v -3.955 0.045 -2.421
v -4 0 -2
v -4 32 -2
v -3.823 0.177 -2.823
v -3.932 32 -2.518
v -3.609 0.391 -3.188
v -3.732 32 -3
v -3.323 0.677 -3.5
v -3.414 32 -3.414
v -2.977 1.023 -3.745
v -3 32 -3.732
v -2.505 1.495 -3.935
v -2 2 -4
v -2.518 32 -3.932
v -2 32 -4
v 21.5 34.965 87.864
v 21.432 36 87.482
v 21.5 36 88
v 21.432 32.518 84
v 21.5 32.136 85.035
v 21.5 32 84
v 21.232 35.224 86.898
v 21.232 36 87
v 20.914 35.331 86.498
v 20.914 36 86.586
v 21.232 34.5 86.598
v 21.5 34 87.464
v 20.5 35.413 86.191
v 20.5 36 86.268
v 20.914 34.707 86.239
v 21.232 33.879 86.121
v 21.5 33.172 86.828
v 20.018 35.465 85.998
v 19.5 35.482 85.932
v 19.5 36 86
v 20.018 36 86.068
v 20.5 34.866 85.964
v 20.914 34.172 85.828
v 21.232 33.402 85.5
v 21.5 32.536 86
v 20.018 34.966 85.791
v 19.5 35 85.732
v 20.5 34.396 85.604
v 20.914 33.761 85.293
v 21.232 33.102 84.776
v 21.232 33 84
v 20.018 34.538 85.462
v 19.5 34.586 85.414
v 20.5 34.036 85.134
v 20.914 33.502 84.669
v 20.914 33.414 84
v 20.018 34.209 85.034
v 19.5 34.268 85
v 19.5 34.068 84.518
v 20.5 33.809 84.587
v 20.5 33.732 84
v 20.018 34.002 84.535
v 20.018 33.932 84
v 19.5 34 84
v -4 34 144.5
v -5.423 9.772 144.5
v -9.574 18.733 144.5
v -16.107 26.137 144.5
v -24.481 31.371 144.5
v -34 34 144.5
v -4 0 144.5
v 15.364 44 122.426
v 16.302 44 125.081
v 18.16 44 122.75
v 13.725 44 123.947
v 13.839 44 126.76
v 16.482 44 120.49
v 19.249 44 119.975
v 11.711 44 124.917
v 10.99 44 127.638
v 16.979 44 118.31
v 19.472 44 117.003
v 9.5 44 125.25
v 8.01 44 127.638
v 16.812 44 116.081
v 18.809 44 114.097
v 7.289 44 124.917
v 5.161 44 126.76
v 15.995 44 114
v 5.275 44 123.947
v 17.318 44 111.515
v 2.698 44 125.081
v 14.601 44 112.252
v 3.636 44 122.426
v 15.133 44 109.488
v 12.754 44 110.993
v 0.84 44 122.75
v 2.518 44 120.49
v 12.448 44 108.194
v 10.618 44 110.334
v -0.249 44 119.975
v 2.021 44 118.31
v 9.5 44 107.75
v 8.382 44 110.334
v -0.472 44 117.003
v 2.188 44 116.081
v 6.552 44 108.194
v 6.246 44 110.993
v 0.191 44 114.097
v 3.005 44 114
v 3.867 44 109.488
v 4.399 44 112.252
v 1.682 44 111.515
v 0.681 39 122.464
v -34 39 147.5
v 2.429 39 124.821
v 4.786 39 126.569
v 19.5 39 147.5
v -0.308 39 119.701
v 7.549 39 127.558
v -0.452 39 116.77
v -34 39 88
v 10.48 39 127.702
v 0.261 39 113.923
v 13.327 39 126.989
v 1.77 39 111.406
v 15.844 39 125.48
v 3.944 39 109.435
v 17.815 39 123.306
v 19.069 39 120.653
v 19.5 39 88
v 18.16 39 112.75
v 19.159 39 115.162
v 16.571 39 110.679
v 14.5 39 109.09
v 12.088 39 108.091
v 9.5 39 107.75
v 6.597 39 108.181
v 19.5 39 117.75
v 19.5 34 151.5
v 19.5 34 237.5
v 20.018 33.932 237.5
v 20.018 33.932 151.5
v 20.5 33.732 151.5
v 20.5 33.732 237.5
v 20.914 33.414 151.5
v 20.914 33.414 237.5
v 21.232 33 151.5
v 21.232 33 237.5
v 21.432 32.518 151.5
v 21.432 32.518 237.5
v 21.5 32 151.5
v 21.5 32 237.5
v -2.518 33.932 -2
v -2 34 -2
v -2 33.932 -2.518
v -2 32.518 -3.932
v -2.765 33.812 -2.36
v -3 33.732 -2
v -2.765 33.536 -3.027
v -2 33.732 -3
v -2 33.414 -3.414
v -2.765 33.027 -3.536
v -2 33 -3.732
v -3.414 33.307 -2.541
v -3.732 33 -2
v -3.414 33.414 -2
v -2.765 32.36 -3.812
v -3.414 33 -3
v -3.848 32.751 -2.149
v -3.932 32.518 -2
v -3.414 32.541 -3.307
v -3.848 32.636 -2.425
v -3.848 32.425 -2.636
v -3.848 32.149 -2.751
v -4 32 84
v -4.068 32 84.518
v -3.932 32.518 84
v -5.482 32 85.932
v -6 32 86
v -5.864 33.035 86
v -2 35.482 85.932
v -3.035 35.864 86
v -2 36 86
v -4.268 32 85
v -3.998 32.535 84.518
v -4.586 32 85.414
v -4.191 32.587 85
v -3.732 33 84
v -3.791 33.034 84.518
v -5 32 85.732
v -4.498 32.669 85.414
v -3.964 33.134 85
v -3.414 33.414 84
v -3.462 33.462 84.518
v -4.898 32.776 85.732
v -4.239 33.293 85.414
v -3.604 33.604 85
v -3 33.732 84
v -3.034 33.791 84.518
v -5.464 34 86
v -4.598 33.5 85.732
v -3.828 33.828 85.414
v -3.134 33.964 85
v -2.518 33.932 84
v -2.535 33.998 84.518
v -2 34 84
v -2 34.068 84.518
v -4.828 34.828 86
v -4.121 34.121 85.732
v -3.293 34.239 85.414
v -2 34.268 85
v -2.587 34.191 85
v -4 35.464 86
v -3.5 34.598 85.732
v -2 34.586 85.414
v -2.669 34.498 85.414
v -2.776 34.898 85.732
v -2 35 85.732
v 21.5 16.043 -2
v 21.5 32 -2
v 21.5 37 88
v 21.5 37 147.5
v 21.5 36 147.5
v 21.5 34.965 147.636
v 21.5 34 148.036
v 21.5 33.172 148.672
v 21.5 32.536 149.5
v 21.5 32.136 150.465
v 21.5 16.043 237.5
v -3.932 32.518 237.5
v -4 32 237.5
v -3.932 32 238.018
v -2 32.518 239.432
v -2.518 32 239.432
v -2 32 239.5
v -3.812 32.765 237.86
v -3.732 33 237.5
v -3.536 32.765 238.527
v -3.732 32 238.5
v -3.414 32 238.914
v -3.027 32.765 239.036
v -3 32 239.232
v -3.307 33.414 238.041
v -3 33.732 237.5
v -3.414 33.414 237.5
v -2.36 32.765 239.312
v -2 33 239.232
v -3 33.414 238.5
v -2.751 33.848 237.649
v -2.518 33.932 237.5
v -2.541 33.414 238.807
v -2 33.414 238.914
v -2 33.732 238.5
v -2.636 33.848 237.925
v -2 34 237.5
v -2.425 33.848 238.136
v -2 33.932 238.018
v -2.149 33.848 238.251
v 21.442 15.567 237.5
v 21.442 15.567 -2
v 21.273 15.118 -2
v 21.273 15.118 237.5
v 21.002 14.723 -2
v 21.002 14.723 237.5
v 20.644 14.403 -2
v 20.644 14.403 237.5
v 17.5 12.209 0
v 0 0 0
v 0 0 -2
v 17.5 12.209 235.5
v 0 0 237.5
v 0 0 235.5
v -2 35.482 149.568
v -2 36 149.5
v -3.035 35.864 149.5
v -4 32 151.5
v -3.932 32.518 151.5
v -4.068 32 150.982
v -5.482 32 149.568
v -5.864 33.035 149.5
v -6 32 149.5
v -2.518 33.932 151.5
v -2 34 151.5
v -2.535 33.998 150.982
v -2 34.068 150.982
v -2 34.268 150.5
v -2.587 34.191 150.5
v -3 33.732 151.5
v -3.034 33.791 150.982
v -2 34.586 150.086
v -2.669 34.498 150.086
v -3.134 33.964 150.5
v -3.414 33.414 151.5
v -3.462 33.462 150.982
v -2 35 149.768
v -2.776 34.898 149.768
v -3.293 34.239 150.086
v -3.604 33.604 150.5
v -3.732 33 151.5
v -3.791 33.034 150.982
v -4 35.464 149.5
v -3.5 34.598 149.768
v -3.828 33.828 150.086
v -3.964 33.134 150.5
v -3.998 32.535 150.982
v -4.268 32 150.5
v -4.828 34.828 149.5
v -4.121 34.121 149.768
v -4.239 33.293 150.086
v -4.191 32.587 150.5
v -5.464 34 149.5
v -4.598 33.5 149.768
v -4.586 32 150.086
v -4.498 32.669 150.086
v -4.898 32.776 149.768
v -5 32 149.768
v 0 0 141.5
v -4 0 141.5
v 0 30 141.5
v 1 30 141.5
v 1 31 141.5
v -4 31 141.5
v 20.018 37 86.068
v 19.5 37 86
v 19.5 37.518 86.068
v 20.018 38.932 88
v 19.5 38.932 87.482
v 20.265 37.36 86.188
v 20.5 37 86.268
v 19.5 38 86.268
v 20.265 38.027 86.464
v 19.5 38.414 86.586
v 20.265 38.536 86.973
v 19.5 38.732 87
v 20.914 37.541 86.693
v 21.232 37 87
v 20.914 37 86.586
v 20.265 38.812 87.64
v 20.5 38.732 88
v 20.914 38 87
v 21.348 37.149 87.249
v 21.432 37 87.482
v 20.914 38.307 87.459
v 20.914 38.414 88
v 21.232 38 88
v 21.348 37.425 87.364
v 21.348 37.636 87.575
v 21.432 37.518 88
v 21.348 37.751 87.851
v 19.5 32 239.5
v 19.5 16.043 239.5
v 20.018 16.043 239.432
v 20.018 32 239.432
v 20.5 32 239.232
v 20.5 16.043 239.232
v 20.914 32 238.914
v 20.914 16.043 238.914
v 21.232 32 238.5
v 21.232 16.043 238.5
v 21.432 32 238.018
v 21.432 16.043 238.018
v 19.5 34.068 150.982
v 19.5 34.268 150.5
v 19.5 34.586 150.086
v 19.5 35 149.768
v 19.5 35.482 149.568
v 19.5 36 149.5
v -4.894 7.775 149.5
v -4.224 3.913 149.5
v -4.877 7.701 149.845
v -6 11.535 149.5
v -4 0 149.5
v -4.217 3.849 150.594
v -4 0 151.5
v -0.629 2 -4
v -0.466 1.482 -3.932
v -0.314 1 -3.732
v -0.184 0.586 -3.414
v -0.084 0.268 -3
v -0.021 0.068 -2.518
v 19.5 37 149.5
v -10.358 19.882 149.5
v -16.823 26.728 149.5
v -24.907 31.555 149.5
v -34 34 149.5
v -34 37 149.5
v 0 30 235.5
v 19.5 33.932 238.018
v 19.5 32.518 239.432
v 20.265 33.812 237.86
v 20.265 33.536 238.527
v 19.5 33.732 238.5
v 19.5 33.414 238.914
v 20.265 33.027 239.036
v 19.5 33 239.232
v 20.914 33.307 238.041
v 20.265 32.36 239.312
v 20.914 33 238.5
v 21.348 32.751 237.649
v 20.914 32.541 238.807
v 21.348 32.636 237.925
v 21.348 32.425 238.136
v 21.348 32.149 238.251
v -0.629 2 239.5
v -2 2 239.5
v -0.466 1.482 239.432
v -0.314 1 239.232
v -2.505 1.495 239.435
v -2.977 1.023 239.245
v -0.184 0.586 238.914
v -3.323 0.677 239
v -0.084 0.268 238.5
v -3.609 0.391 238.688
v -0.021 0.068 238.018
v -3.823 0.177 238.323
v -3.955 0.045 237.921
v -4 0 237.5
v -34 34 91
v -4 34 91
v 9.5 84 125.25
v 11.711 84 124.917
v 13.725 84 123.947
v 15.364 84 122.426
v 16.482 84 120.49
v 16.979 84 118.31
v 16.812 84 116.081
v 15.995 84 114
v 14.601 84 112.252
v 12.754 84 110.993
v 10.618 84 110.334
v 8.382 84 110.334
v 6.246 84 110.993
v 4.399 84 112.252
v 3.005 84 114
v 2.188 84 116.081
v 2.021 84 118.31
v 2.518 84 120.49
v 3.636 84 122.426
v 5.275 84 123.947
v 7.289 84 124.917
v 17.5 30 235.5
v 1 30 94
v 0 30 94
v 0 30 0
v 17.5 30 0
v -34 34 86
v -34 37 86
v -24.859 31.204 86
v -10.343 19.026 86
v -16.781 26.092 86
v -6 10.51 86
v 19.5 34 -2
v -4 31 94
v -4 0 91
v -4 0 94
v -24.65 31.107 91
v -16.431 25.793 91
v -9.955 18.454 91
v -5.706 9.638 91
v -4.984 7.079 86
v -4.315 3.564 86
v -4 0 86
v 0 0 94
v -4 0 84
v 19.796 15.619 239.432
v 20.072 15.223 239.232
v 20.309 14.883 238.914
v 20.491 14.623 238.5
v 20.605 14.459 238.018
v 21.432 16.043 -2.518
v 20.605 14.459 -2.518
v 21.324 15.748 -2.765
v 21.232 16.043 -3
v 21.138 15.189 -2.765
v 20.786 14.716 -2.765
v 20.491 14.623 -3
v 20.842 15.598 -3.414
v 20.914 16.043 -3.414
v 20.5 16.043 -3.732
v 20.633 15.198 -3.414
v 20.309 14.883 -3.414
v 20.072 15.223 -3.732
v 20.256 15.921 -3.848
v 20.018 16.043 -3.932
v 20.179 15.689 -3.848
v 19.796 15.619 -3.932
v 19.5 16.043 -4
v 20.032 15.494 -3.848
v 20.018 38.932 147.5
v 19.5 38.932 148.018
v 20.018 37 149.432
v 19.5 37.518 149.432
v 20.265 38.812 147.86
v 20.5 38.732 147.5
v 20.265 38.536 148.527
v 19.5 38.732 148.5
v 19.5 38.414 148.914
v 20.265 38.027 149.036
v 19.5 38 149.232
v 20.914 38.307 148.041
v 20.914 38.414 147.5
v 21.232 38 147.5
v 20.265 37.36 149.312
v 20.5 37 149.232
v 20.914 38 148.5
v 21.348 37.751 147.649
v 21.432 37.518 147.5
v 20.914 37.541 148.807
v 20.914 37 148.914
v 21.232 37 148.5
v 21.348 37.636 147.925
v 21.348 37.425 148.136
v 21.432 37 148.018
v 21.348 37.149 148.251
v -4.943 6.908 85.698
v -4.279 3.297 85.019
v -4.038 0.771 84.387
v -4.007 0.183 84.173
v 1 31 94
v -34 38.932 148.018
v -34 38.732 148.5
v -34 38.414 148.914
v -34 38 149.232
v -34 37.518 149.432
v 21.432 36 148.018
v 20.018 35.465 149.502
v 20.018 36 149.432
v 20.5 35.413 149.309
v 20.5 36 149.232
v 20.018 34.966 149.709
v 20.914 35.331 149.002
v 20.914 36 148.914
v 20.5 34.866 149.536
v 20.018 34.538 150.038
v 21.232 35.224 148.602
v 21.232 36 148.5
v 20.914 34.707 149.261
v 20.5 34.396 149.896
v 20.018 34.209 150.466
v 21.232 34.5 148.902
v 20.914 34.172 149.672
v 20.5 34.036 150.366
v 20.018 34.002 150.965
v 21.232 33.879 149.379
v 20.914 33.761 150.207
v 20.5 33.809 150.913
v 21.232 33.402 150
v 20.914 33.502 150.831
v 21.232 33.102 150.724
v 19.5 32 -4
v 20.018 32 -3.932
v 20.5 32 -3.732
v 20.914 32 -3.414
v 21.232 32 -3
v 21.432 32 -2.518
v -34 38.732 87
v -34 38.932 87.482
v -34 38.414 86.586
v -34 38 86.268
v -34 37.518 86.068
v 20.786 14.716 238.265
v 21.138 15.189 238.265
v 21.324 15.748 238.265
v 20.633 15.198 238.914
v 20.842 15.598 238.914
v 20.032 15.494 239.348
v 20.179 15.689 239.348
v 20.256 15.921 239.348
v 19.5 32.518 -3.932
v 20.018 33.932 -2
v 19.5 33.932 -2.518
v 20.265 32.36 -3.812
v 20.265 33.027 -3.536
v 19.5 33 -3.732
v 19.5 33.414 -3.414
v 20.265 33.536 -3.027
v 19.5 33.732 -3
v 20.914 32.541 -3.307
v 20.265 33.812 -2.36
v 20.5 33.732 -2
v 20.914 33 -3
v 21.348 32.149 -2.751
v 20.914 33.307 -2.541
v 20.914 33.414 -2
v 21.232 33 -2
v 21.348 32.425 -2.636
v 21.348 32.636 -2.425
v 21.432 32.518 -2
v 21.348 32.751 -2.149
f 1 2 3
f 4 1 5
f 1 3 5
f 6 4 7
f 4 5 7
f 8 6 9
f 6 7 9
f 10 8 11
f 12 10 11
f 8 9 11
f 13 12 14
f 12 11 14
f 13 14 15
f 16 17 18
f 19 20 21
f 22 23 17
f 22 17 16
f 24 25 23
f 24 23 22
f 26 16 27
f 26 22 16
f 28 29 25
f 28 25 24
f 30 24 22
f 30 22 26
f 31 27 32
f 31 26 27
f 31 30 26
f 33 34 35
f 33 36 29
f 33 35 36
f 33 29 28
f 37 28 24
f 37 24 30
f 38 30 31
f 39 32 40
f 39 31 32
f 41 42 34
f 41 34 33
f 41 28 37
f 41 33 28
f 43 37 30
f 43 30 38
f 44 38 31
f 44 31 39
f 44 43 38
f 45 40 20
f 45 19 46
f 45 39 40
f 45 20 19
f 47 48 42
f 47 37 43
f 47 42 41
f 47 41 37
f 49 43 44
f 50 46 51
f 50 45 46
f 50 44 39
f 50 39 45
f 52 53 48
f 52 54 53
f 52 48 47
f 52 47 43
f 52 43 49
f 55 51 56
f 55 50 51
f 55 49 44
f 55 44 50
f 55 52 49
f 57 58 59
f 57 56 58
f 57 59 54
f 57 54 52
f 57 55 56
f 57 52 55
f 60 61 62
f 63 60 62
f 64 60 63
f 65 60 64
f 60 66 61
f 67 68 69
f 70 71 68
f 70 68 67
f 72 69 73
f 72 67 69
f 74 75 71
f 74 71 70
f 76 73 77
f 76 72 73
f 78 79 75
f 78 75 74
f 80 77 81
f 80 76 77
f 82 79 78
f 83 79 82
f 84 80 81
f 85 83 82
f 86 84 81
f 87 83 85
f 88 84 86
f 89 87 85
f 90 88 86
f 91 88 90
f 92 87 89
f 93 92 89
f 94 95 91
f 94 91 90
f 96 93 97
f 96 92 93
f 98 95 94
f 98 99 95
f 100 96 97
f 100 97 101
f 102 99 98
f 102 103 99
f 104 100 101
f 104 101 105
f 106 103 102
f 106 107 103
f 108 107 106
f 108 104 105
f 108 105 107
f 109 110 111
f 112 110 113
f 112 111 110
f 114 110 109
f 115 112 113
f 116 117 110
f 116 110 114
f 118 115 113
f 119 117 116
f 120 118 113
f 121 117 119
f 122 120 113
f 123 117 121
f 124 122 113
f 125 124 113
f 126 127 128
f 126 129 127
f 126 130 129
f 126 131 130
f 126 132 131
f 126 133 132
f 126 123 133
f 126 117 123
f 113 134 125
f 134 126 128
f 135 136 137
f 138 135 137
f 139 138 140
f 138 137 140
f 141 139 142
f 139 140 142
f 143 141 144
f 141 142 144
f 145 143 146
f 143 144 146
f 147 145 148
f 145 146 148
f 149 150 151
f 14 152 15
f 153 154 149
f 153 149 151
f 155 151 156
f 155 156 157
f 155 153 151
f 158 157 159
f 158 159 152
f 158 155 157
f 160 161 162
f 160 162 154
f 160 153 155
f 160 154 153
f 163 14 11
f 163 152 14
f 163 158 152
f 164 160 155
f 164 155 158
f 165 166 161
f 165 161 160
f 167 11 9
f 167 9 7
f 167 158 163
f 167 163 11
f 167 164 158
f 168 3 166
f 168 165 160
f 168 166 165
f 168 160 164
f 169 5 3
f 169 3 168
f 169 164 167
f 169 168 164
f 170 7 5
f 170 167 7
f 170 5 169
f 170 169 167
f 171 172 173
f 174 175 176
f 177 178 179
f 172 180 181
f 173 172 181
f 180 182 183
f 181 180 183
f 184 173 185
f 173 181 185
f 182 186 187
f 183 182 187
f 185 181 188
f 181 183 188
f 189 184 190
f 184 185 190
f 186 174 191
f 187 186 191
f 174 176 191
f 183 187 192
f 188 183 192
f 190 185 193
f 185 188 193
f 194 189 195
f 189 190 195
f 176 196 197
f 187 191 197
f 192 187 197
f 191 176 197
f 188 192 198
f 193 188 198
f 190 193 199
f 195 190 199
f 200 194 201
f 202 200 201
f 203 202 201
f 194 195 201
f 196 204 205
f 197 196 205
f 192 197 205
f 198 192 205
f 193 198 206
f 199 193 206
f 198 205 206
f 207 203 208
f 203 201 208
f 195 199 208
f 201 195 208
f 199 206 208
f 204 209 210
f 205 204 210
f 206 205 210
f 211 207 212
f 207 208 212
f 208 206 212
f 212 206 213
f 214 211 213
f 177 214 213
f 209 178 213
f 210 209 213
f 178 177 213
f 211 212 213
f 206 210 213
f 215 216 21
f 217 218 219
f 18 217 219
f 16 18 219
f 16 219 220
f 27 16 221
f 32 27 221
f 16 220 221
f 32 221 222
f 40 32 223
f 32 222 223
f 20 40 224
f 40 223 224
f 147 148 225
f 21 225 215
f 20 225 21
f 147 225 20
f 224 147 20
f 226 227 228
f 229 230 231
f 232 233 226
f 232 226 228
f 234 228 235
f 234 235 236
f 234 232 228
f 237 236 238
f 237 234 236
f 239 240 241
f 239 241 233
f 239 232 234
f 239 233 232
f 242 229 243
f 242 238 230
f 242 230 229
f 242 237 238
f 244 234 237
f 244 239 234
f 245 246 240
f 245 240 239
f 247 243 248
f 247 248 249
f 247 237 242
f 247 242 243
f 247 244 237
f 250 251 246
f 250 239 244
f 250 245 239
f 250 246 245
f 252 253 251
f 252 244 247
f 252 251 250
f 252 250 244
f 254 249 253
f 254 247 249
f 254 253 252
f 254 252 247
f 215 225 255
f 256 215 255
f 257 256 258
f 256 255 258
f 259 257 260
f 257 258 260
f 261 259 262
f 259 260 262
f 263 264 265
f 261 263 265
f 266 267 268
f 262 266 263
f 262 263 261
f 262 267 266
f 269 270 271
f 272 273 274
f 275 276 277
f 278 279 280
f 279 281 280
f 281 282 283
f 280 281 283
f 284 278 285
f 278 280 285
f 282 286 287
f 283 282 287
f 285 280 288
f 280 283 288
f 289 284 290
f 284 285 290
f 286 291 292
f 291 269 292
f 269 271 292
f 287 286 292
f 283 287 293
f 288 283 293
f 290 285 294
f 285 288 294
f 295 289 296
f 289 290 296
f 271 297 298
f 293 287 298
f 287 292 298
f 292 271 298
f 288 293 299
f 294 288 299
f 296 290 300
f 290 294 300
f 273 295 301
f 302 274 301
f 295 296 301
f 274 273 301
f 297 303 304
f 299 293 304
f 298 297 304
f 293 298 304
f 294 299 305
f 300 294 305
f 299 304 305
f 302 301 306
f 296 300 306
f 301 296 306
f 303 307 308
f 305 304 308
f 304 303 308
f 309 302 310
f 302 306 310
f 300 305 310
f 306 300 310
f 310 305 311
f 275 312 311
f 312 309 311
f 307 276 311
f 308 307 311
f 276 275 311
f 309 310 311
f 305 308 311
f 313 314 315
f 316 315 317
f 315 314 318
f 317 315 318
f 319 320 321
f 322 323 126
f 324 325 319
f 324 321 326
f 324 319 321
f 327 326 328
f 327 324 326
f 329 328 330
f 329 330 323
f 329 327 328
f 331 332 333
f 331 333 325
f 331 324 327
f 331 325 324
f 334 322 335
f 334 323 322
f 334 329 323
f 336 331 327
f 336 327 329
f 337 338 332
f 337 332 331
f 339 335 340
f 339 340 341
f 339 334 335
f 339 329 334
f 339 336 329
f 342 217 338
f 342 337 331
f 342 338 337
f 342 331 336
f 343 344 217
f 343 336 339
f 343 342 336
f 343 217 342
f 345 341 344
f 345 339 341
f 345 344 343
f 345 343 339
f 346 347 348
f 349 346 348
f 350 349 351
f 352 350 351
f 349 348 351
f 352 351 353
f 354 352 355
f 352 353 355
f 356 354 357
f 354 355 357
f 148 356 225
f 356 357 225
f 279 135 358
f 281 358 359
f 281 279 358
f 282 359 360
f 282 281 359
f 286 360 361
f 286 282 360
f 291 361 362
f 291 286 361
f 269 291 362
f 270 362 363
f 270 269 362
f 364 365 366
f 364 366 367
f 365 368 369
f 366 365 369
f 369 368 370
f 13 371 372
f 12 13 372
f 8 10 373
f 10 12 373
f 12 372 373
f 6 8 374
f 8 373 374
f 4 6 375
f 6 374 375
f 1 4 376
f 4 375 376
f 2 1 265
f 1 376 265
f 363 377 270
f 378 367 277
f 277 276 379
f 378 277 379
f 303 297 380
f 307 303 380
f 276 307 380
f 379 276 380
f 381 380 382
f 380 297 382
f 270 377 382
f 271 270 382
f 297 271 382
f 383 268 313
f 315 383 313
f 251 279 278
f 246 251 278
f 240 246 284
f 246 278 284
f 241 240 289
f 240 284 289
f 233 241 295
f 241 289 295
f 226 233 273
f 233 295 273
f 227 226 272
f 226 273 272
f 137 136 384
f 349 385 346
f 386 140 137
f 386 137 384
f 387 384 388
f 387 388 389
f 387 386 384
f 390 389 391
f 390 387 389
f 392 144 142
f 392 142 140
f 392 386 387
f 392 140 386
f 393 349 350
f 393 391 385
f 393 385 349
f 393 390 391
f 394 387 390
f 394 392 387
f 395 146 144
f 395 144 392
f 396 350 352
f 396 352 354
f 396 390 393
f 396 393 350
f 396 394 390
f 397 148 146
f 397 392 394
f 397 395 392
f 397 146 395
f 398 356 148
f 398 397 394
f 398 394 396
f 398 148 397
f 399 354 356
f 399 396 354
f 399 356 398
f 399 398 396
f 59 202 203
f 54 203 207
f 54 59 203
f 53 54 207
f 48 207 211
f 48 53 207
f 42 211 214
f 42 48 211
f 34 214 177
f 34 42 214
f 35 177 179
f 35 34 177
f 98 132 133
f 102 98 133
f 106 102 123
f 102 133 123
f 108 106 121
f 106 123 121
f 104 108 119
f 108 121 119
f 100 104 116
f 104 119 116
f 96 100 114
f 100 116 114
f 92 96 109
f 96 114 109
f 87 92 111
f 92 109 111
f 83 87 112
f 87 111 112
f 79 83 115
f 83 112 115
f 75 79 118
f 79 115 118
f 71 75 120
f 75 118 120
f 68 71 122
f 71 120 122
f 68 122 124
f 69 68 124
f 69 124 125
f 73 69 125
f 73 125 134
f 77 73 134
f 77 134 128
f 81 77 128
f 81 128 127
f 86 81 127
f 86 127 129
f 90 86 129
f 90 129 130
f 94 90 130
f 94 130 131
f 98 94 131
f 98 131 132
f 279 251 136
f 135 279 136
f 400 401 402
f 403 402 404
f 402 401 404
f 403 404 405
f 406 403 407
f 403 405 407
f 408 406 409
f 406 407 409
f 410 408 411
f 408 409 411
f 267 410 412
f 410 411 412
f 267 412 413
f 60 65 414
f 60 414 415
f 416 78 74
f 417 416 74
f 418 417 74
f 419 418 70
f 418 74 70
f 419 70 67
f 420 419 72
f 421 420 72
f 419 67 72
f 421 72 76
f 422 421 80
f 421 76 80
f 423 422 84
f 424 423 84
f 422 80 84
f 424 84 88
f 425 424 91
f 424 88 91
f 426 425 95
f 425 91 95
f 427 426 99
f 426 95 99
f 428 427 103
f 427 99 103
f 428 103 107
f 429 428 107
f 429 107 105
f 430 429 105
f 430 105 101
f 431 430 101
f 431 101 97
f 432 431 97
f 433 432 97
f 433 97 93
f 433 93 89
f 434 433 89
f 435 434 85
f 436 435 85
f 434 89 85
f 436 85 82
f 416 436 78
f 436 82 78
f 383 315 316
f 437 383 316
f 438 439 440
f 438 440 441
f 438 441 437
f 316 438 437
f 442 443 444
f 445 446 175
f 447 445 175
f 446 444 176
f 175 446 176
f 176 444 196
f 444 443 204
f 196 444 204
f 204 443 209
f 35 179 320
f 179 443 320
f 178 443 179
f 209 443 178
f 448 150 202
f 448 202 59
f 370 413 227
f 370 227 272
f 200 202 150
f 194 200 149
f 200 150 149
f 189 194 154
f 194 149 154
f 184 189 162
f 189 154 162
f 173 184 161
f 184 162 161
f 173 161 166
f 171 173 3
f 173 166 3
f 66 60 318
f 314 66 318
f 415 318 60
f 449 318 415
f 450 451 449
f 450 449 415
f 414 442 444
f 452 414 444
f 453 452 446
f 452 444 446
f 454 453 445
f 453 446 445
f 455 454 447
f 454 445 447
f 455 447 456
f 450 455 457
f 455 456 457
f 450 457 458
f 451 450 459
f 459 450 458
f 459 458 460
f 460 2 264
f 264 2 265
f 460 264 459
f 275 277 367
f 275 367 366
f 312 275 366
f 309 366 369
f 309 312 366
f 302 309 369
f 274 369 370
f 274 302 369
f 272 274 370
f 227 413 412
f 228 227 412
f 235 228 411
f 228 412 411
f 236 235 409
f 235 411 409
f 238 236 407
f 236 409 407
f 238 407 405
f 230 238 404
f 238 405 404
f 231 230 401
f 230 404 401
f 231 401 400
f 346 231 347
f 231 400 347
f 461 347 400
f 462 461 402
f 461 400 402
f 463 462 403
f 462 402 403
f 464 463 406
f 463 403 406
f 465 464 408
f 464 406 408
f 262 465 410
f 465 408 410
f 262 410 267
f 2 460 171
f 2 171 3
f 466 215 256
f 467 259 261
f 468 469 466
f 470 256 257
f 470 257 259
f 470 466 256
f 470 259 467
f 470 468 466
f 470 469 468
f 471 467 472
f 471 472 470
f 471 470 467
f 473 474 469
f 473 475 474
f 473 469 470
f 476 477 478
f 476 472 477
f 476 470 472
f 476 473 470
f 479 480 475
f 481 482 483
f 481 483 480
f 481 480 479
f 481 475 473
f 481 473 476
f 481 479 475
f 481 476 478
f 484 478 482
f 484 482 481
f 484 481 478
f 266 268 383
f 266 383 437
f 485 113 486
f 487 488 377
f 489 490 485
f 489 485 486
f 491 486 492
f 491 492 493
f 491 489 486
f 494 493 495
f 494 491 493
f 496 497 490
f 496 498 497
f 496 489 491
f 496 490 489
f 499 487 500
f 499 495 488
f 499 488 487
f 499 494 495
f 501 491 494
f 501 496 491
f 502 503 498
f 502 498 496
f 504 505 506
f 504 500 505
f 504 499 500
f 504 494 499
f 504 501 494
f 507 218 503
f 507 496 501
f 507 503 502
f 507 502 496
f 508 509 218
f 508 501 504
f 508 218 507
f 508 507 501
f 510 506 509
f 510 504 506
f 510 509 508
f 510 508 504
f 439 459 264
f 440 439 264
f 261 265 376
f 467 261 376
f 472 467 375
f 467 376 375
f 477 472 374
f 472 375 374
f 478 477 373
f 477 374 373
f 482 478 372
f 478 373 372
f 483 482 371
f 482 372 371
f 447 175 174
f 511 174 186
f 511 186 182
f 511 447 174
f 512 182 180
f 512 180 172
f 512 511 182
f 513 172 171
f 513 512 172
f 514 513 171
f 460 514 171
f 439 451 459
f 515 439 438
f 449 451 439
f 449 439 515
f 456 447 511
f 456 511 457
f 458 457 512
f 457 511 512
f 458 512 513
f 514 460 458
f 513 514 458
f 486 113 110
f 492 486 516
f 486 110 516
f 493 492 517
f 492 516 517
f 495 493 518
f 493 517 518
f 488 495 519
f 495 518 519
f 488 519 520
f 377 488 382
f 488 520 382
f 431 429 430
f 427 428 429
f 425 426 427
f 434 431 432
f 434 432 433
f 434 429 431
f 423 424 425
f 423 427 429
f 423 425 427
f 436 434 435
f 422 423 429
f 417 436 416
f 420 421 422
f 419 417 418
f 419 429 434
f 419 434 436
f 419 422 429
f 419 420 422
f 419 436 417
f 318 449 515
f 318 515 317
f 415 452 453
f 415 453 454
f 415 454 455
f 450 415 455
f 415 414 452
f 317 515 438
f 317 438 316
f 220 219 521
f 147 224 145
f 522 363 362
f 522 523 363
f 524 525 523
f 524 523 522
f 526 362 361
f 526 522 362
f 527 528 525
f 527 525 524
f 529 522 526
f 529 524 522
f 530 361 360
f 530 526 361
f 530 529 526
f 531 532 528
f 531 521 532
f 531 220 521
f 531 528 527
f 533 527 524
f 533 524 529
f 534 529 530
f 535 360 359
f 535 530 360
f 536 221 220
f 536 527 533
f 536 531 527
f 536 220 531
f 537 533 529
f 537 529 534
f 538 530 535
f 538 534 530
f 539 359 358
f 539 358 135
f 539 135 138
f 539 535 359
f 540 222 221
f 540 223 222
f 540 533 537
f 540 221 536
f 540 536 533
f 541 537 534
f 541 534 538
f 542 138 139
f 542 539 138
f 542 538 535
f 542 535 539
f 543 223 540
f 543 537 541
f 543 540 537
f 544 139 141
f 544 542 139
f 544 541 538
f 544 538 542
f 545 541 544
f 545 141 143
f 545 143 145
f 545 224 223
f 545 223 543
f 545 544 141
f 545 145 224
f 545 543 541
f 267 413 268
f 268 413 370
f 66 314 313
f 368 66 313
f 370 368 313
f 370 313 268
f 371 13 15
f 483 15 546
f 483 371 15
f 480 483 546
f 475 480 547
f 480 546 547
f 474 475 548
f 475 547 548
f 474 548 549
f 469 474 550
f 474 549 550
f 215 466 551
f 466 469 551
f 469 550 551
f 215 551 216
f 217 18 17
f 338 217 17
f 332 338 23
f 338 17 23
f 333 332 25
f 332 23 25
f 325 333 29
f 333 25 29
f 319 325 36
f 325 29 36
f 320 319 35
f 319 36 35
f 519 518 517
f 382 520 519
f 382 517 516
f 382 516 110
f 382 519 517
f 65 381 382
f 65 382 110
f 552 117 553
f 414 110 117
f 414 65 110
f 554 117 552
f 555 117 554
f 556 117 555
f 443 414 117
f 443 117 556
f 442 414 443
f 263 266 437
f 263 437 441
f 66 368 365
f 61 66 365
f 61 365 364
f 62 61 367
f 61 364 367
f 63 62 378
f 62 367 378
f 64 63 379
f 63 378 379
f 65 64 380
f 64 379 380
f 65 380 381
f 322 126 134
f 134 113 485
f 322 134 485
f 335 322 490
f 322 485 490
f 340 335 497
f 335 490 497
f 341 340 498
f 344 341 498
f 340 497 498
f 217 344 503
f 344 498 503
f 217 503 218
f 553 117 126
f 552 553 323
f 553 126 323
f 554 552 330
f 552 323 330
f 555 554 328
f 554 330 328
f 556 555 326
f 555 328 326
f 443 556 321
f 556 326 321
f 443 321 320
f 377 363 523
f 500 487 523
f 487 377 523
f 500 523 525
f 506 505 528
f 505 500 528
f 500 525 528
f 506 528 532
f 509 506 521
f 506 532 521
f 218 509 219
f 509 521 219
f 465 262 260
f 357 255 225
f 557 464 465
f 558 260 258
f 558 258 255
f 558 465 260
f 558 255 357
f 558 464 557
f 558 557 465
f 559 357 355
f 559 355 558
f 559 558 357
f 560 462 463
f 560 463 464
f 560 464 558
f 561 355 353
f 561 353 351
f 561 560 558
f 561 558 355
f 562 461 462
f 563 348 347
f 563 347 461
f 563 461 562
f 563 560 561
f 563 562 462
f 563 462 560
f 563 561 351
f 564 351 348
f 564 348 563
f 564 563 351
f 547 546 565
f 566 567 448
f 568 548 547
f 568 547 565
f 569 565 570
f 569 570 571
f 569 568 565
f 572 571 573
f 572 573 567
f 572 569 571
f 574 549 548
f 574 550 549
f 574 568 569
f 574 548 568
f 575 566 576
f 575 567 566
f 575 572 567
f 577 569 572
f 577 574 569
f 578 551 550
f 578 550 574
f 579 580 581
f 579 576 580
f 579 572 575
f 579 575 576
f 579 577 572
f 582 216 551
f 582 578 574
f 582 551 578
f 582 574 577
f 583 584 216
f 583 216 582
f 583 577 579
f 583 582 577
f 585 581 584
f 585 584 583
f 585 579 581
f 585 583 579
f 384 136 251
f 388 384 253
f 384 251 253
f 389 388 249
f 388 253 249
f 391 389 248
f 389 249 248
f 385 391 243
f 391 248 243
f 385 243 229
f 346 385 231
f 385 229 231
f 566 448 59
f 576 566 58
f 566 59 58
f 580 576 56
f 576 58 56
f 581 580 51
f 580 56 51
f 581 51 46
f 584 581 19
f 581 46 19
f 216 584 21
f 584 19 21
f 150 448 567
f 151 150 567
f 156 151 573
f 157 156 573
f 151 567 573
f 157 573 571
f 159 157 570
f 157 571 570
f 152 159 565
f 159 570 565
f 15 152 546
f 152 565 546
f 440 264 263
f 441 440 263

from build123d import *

# Parameters (mm, degrees)
SKETCH1_W                         = 25.5
SKETCH1_H                         = 243.5
SKETCH1_W_2                       = 17.5
SKETCH1_H_2                       = 235.5
MOTOR_PANEL_CONNECTOR_DEPTH       = 34
SKETCH3_W                         = 25.5
SKETCH3_H                         = 243.5
MOTOR_PANEL_CONNECCTOR_BASE_DEPTH = 4
UP_DOWN_CONNECT_CUT_DEPTH         = 250
SKETCH5_W                         = 47.5
SKETCH5_H                         = 31
CUT_TO_NAIL_PART_DEPTH            = 5
SKETCH6_W                         = 55.5
SKETCH6_H                         = 63.5
PANEL_CONNECTOR_DEPTH             = 5
SKETCH7_R                         = 10
BOSS_EXTRUDE4_DEPTH               = 5
BOSS_EXTRUDE5_DEPTH               = 5
BOSS_EXTRUDE6_DEPTH               = 5
SKETCH14_R                        = 7.5
BOSS_EXTRUDE7_DEPTH               = 40
FILLET3_R                         = 2


with BuildPart() as part:
    # Sketch1 → motor -panel connector (new body)
    with BuildSketch(Plane(origin=(0, 0, 0), x_dir=(1, 0, 0), z_dir=(0, 1, 0))):
        with Locations((8.75, -117.75)):
            Rectangle(SKETCH1_W, SKETCH1_H)
        with Locations((8.75, -117.75)):
            Rectangle(SKETCH1_W_2, SKETCH1_H_2, mode=Mode.SUBTRACT)
    extrude(amount=MOTOR_PANEL_CONNECTOR_DEPTH)

    # Sketch3 → motor-panel connecctor base (add)
    with BuildSketch(Plane(origin=(0, 34, 0), x_dir=(1, 0, 0), z_dir=(0, 1, 0))):
        with Locations((8.75, -117.75)):
            Rectangle(SKETCH3_W, SKETCH3_H)
    extrude(amount=-MOTOR_PANEL_CONNECCTOR_BASE_DEPTH)

    # Sketch4 → up down connect cut (cut)
    with BuildSketch(Plane.XY.offset(239.5)):
        Polygon((0, 0), (21.5, 15), (21.5, 0), align=None)
    extrude(amount=-UP_DOWN_CONNECT_CUT_DEPTH, mode=Mode.SUBTRACT)

    # Sketch5 → cut to nail part (cut)
    with BuildSketch(Plane.ZY.offset(4)):
        with Locations((117.75, 15.5)):
            Rectangle(SKETCH5_W, SKETCH5_H)
    extrude(amount=-CUT_TO_NAIL_PART_DEPTH, mode=Mode.SUBTRACT)

    # Sketch6 → panel connector (add)
    with BuildSketch(Plane(origin=(0, 34, 0), x_dir=(1, 0, 0), z_dir=(0, 1, 0))):
        with Locations((-6.25, -117.75)):
            Rectangle(SKETCH6_W, SKETCH6_H)
    extrude(amount=PANEL_CONNECTOR_DEPTH)

    # Sketch7 → Boss-Extrude4 (add)
    with BuildSketch(Plane(origin=(0, 39, 0), x_dir=(1, 0, 0), z_dir=(0, 1, 0))):
        with Locations(Location((9.5, -117.75, 0), (0, 0, 90))):
            Circle(SKETCH7_R)
    extrude(amount=BOSS_EXTRUDE4_DEPTH)

    # Sketch8 → Boss-Extrude5 (add)
    with BuildSketch(Plane.XY.offset(149.5)):
        with BuildLine():
            Line((-34, 34), (-4, 34))
            Line((-4, 34), (-4, 0))
            ThreePointArc((-4, 0), (-12.572222823, 22.671568098), (-34, 34))
        make_face()
    extrude(amount=-BOSS_EXTRUDE5_DEPTH)

    # Sketch13 → Boss-Extrude6 (add)
    with BuildSketch(Plane(origin=(0, 0, 86), x_dir=(-1, 0, 0), z_dir=(0, 0, -1))):
        with BuildLine():
            Line((4, 0), (4, 34))
            Line((4, 34), (34, 34))
            ThreePointArc((34, 34), (12.941232514, 22.345971311), (4, 0))
        make_face()
    extrude(amount=-BOSS_EXTRUDE6_DEPTH)

    # Sketch14 → Boss-Extrude7 (add)
    with BuildSketch(Plane(origin=(0, 44, 0), x_dir=(1, 0, 0), z_dir=(0, 1, 0))):
        with Locations(Location((9.5, -117.75, 0), (0, 0, 270))):
            Circle(SKETCH14_R)
    extrude(amount=BOSS_EXTRUDE7_DEPTH)

    # Fillet3
    # the kernel refuses this fillet: 2 mm, written as the material it takes off along each edge
    with BuildSketch(Plane(origin=(-2, 32, 237.5), x_dir=(-1, 0, 0), z_dir=(0, 1, 0))) as fillet3_piece_1_section:
        Polygon((0, 0), (FILLET3_R * 1.02, 0), (FILLET3_R * 1.02, FILLET3_R * 1.02), (0, FILLET3_R * 1.02), align=None)
    fillet3_piece_1 = extrude(amount=FILLET3_R * 1.02, mode=Mode.PRIVATE)
    fillet3_piece_1 = fillet3_piece_1 - Plane(origin=(-2, 32, 237.5), x_dir=(0.7071067811865475, 0, -0.7071067811865475), z_dir=(0, 1, 0)) * Sphere(FILLET3_R, mode=Mode.PRIVATE)
    add(fillet3_piece_1, mode=Mode.SUBTRACT)
    with BuildSketch(Plane(origin=(-2, 32, -2), x_dir=(0, 1, 0), z_dir=(-1, 0, 0))) as fillet3_piece_2_section:
        Polygon((0, 0), (FILLET3_R * 1.02, 0), (FILLET3_R * 1.02, FILLET3_R * 1.02), (0, FILLET3_R * 1.02), align=None)
    fillet3_piece_2 = extrude(amount=FILLET3_R * 1.02, mode=Mode.PRIVATE)
    fillet3_piece_2 = fillet3_piece_2 - Plane(origin=(-2, 32, -2), x_dir=(0, -0.7071067811865475, 0.7071067811865475), z_dir=(-1, 0, 0)) * Sphere(FILLET3_R, mode=Mode.PRIVATE)
    add(fillet3_piece_2, mode=Mode.SUBTRACT)
    with BuildSketch(Plane(origin=(19.5, 16.043297996, 237.5), x_dir=(0.5721815960240814, -0.8201269543011832, 0), z_dir=(0, 0, 1))) as fillet3_piece_3_section:
        Polygon((0, 0), (FILLET3_R * 1.02, 0), (FILLET3_R * 1.02, FILLET3_R * 0.532081978), (FILLET3_R * 0.583625227945, FILLET3_R * 0.836529493387), align=None)
    fillet3_piece_3 = extrude(amount=FILLET3_R * 1.02, mode=Mode.PRIVATE)
    fillet3_piece_3 = fillet3_piece_3 - Plane(origin=(19.5, 16.043297996, 237.5), x_dir=(-0.886617616569872, 0.4625031913273241, 0), z_dir=(0, 0, 1)) * Sphere(FILLET3_R, mode=Mode.PRIVATE)
    add(fillet3_piece_3, mode=Mode.SUBTRACT)
    with BuildSketch(Plane(origin=(19.5, 16.043297996, -2), x_dir=(0.5721815960240814, -0.8201269543011832, 0), z_dir=(0, 0, -1))) as fillet3_piece_4_section:
        Polygon((0, 0), (FILLET3_R * 1.02, 0), (FILLET3_R * 1.02, -FILLET3_R * 0.532081978), (FILLET3_R * 0.583625227945, -FILLET3_R * 0.836529493387), align=None)
    fillet3_piece_4 = extrude(amount=FILLET3_R * 1.02, mode=Mode.PRIVATE)
    fillet3_piece_4 = fillet3_piece_4 - Plane(origin=(19.5, 16.043297996, -2), x_dir=(-0.886617616569872, 0.4625031913273241, 0), z_dir=(0, 0, -1)) * Sphere(FILLET3_R, mode=Mode.PRIVATE)
    add(fillet3_piece_4, mode=Mode.SUBTRACT)
    with BuildSketch(Plane(origin=(21.5, 39, 154.5), x_dir=(0, -1, 0), z_dir=(0, 0, -1))) as fillet3_piece_5:
        with BuildLine():
            CenterArc((FILLET3_R, FILLET3_R), FILLET3_R, 180, 90)
            Line((0, FILLET3_R), (0, 0))
            Line((0, 0), (FILLET3_R, 0))
        make_face()
    extrude(amount=73.5, mode=Mode.SUBTRACT)
    with BuildSketch(Plane(origin=(26.5, 39, 86), x_dir=(0, -1, 0), z_dir=(-1, 0, 0))) as fillet3_piece_6:
        with BuildLine():
            CenterArc((FILLET3_R, FILLET3_R), FILLET3_R, 180, 90)
            Line((0, FILLET3_R), (0, 0))
            Line((0, 0), (FILLET3_R, 0))
        make_face()
    extrude(amount=65.5, mode=Mode.SUBTRACT)
    with BuildSketch(Plane(origin=(-39, 39, 149.5), x_dir=(0, 0, -1), z_dir=(1, 0, 0))) as fillet3_piece_7:
        with BuildLine():
            CenterArc((FILLET3_R, -FILLET3_R), FILLET3_R, 90, 90)
            Line((0, -FILLET3_R), (0, 0))
            Line((0, 0), (FILLET3_R, 0))
        make_face()
    extrude(amount=65.5, mode=Mode.SUBTRACT)
    with BuildSketch(Plane(origin=(-2, 34, 239.5), x_dir=(0, -1, 0), z_dir=(1, 0, 0))) as fillet3_piece_8:
        with BuildLine():
            CenterArc((FILLET3_R, FILLET3_R), FILLET3_R, 180, 90)
            Line((0, FILLET3_R), (0, 0))
            Line((0, 0), (FILLET3_R, 0))
        make_face()
    extrude(amount=28.5, mode=Mode.SUBTRACT)
    with BuildSketch(Plane(origin=(26.5, 34, -4), x_dir=(0, 0, 1), z_dir=(-1, 0, 0))) as fillet3_piece_9:
        with BuildLine():
            CenterArc((FILLET3_R, -FILLET3_R), FILLET3_R, 90, 90)
            Line((0, -FILLET3_R), (0, 0))
            Line((0, 0), (FILLET3_R, 0))
        make_face()
    extrude(amount=28.5, mode=Mode.SUBTRACT)
    with BuildSketch(Plane(origin=(21.5, 15, 237.5), x_dir=(-0.8201269543011818, -0.5721815960240832, 0), z_dir=(0, 0, -1))) as fillet3_piece_10:
        with BuildLine():
            CenterArc((FILLET3_R * 0.521648998039, FILLET3_R), FILLET3_R, 214.902495616, 55.097504384)
            Line((-FILLET3_R * 0.298477956262, FILLET3_R * 0.427818403976), (0, 0))
            Line((0, 0), (FILLET3_R * 0.521648998039, 0))
        make_face()
    extrude(amount=239.5, mode=Mode.SUBTRACT)
    with BuildSketch(Plane(origin=(-9, 0, 239.5), x_dir=(0, 1, 0), z_dir=(1, 0, 0))) as fillet3_piece_11:
        with BuildLine():
            CenterArc((FILLET3_R, -FILLET3_R), FILLET3_R, 90, 90)
            Line((0, -FILLET3_R), (0, 0))
            Line((0, 0), (FILLET3_R, 0))
        make_face()
    extrude(amount=14, mode=Mode.SUBTRACT)
    with BuildSketch(Plane(origin=(5, 0, -4), x_dir=(0, 0, 1), z_dir=(-1, 0, 0))) as fillet3_piece_12:
        with BuildLine():
            CenterArc((FILLET3_R, FILLET3_R), FILLET3_R, 180, 90)
            Line((0, FILLET3_R), (0, 0))
            Line((0, 0), (FILLET3_R, 0))
        make_face()
    extrude(amount=14, mode=Mode.SUBTRACT)
    with BuildSketch(Plane(origin=(-4.100634772, -2.86090798, -4), x_dir=(-0.5721815960240814, 0.8201269543011832, 0), z_dir=(0.8201269543011832, 0.5721815960240814, 0)), Plane(origin=(-4.100634772, -2.86090798, 239.5), x_dir=(0, 0, -1), z_dir=(0.8201269543011832, 0.5721815960240814, 0))) as fillet3_piece_13:
        with BuildLine():
            CenterArc((FILLET3_R, FILLET3_R), FILLET3_R, 180, 90)
            Line((0, FILLET3_R), (0, 0))
            Line((0, 0), (FILLET3_R, 0))
        make_face()
    extrude(amount=30.172155462, mode=Mode.SUBTRACT)
    with BuildSketch(Plane(origin=(21.5, 39, -4), x_dir=(-1, 0, 0), z_dir=(0, -1, 0))) as fillet3_piece_14:
        with BuildLine():
            CenterArc((FILLET3_R, -FILLET3_R), FILLET3_R, 90, 90)
            Line((0, -FILLET3_R), (0, 0))
            Line((0, 0), (FILLET3_R, 0))
        make_face()
    extrude(amount=22.956702004, mode=Mode.SUBTRACT)
    with BuildSketch(Plane(origin=(21.5, 16.043297996, 239.5), x_dir=(0, 0, -1), z_dir=(0, 1, 0))) as fillet3_piece_15:
        with BuildLine():
            CenterArc((FILLET3_R, FILLET3_R), FILLET3_R, 180, 90)
            Line((0, FILLET3_R), (0, 0))
            Line((0, 0), (FILLET3_R, 0))
        make_face()
    extrude(amount=22.956702004, mode=Mode.SUBTRACT)
    with BuildSketch(Plane(origin=(-4, -5, 239.5), x_dir=(1, 0, 0), z_dir=(0, 1, 0))) as fillet3_piece_16:
        with BuildLine():
            CenterArc((FILLET3_R, FILLET3_R), FILLET3_R, 180, 90)
            Line((0, FILLET3_R), (0, 0))
            Line((0, 0), (FILLET3_R, 0))
        make_face()
    extrude(amount=37, mode=Mode.SUBTRACT)
    with BuildSketch(Plane(origin=(-4, 32, -4), x_dir=(0, 0, 1), z_dir=(0, -1, 0))) as fillet3_piece_17:
        with BuildLine():
            CenterArc((FILLET3_R, -FILLET3_R), FILLET3_R, 90, 90)
            Line((0, -FILLET3_R), (0, 0))
            Line((0, 0), (FILLET3_R, 0))
        make_face()
    extrude(amount=37, mode=Mode.SUBTRACT)
    with BuildSketch(Plane(origin=(-4, 34, -2), x_dir=(0, -1, 0), z_dir=(0, 0, 1))) as fillet3_piece_18:
        with BuildLine():
            CenterArc((FILLET3_R, FILLET3_R), FILLET3_R, 180, 90)
            Line((0, FILLET3_R), (0, 0))
            Line((0, 0), (FILLET3_R, 0))
        make_face()
    extrude(amount=88, mode=Mode.SUBTRACT)
    with BuildSketch(Plane(origin=(-4, 34, 149.5), x_dir=(1, 0, 0), z_dir=(0, 0, 1))) as fillet3_piece_19:
        with BuildLine():
            CenterArc((FILLET3_R, -FILLET3_R), FILLET3_R, 90, 90)
            Line((0, -FILLET3_R), (0, 0))
            Line((0, 0), (FILLET3_R, 0))
        make_face()
    extrude(amount=88, mode=Mode.SUBTRACT)
    # the kernel refuses this fillet: 2 mm, written as the material it adds along each edge
    with BuildSketch(Plane(origin=(-4, 32, 149.5), x_dir=(-1, 0, 0), z_dir=(0, -1, 0))) as fillet3_2_piece_1_section:
        with BuildLine():
            CenterArc((FILLET3_R, -FILLET3_R), FILLET3_R, 90, 90)
            Line((0, -FILLET3_R), (0, 0))
            Line((0, 0), (FILLET3_R, 0))
        make_face()
    fillet3_2_piece_1 = extrude(amount=32, mode=Mode.PRIVATE)
    fillet3_2_piece_1 = fillet3_2_piece_1 - Plane(origin=(-38.266666667, 0, 149.967222139), x_dir=(1, 0, 0), z_dir=(0, 0, 1)) * Cylinder(34.266666667, 72, mode=Mode.PRIVATE)
    add(fillet3_2_piece_1)
    with BuildSketch(Plane(origin=(-4, 0, 86), x_dir=(0, 0, -1), z_dir=(0, 1, 0))) as fillet3_2_piece_2_section:
        with BuildLine():
            CenterArc((FILLET3_R, FILLET3_R), FILLET3_R, 180, 90)
            Line((0, FILLET3_R), (0, 0))
            Line((0, 0), (FILLET3_R, 0))
        make_face()
    fillet3_2_piece_2 = extrude(amount=32, mode=Mode.PRIVATE)
    fillet3_2_piece_2 = fillet3_2_piece_2 - Plane(origin=(-39.820351429, -1.370898319, 85.534344582), x_dir=(0.16236841120732118, 0.9867302058019762, 0), z_dir=(0, 0, -1)) * Cylinder(35.846574992, 73, mode=Mode.PRIVATE)
    add(fillet3_2_piece_2)
    with BuildSketch(Plane(origin=(-2, 34, 149.5), x_dir=(0, 1, 0), z_dir=(1, 0, 0)), Plane(origin=(21.5, 34, 86), x_dir=(0, 1, 0), z_dir=(-1, 0, 0))) as fillet3_2_piece_3:
        with BuildLine():
            CenterArc((FILLET3_R, FILLET3_R), FILLET3_R, 180, 90)
            Line((0, FILLET3_R), (0, 0))
            Line((0, 0), (FILLET3_R, 0))
        make_face()
    extrude(amount=23.5)
    with BuildSketch(Plane(origin=(-2, 32, 86), x_dir=(-1, 0, 0), z_dir=(0, -1, 0))) as fillet3_2_piece_4:
        with BuildLine():
            CenterArc((2 + FILLET3_R, FILLET3_R), FILLET3_R, 180, 90)
            Line((2, FILLET3_R), (2, 0))
            Line((2, 0), (2 + FILLET3_R, 0))
        make_face()
    revolve(axis=Axis((-2, 32, 86), (0, 0, -1)), revolution_arc=90)
    with BuildSketch(Plane(origin=(-2, 32, 149.5), x_dir=(0, 1, 0), z_dir=(1, 0, 0))) as fillet3_2_piece_5:
        with BuildLine():
            CenterArc((2 + FILLET3_R, FILLET3_R), FILLET3_R, 180, 90)
            Line((2, FILLET3_R), (2, 0))
            Line((2, 0), (2 + FILLET3_R, 0))
        make_face()
    revolve(axis=Axis((-2, 32, 149.5), (0, 0, 1)), revolution_arc=90)
    # the kernel refuses this fillet: 2 mm, written as the material it takes off along each edge
    with BuildSketch(Plane(origin=(19.5, 37, 88), x_dir=(0, 0, -1), z_dir=(1, 0, 0))) as fillet3_3_piece_1_section:
        Polygon((0, 0), (FILLET3_R * 1.02, 0), (FILLET3_R * 1.02, FILLET3_R * 1.02), (0, FILLET3_R * 1.02), align=None)
    fillet3_3_piece_1 = extrude(amount=FILLET3_R * 1.02, mode=Mode.PRIVATE)
    fillet3_3_piece_1 = fillet3_3_piece_1 - Plane(origin=(19.5, 37, 88), x_dir=(0, -0.7071067811865475, 0.7071067811865475), z_dir=(1, 0, 0)) * Sphere(FILLET3_R, mode=Mode.PRIVATE)
    add(fillet3_3_piece_1, mode=Mode.SUBTRACT)
    with BuildSketch(Plane(origin=(19.5, 37, 147.5), x_dir=(0, 0, 1), z_dir=(1, 0, 0))) as fillet3_3_piece_2_section:
        Polygon((0, 0), (FILLET3_R * 1.02, 0), (FILLET3_R * 1.02, -FILLET3_R * 1.02), (0, -FILLET3_R * 1.02), align=None)
    fillet3_3_piece_2 = extrude(amount=FILLET3_R * 1.02, mode=Mode.PRIVATE)
    fillet3_3_piece_2 = fillet3_3_piece_2 - Plane(origin=(19.5, 37, 147.5), x_dir=(0, -0.7071067811865475, -0.7071067811865475), z_dir=(1, 0, 0)) * Sphere(FILLET3_R, mode=Mode.PRIVATE)
    add(fillet3_3_piece_2, mode=Mode.SUBTRACT)
    with BuildSketch(Plane(origin=(19.5, 32, -2), x_dir=(0, 1, 0), z_dir=(1, 0, 0))) as fillet3_3_piece_3_section:
        Polygon((0, 0), (FILLET3_R * 1.02, 0), (FILLET3_R * 1.02, -FILLET3_R * 1.02), (0, -FILLET3_R * 1.02), align=None)
    fillet3_3_piece_3 = extrude(amount=FILLET3_R * 1.02, mode=Mode.PRIVATE)
    fillet3_3_piece_3 = fillet3_3_piece_3 - Plane(origin=(19.5, 32, -2), x_dir=(0, -0.7071067811865475, 0.7071067811865475), z_dir=(1, 0, 0)) * Sphere(FILLET3_R, mode=Mode.PRIVATE)
    add(fillet3_3_piece_3, mode=Mode.SUBTRACT)
    with BuildSketch(Plane(origin=(19.5, 32, 237.5), x_dir=(0, 1, 0), z_dir=(1, 0, 0))) as fillet3_3_piece_4_section:
        Polygon((0, 0), (FILLET3_R * 1.02, 0), (FILLET3_R * 1.02, FILLET3_R * 1.02), (0, FILLET3_R * 1.02), align=None)
    fillet3_3_piece_4 = extrude(amount=FILLET3_R * 1.02, mode=Mode.PRIVATE)
    fillet3_3_piece_4 = fillet3_3_piece_4 - Plane(origin=(19.5, 32, 237.5), x_dir=(0, -0.7071067811865475, -0.7071067811865475), z_dir=(1, 0, 0)) * Sphere(FILLET3_R, mode=Mode.PRIVATE)
    add(fillet3_3_piece_4, mode=Mode.SUBTRACT)
    with BuildSketch(Plane(origin=(21.5, 34, 237.5), x_dir=(0, -1, 0), z_dir=(0, 0, -1)), Plane(origin=(21.5, 34, 84), x_dir=(0, -1, 0), z_dir=(0, 0, -1))) as fillet3_3_piece_5:
        with BuildLine():
            CenterArc((FILLET3_R, FILLET3_R), FILLET3_R, 180, 90)
            Line((0, FILLET3_R), (0, 0))
            Line((0, 0), (FILLET3_R, 0))
        make_face()
    extrude(amount=86, mode=Mode.SUBTRACT)
    with BuildSketch(Plane(origin=(21.5, 36, 149.5), x_dir=(0, 0, -1), z_dir=(0, 1, 0))) as fillet3_3_piece_6:
        with BuildLine():
            CenterArc((FILLET3_R, FILLET3_R), FILLET3_R, 180, 90)
            Line((0, FILLET3_R), (0, 0))
            Line((0, 0), (FILLET3_R, 0))
        make_face()
    extrude(amount=1, mode=Mode.SUBTRACT)
    with BuildSketch(Plane(origin=(21.5, 36, 86), x_dir=(0, 0, 1), z_dir=(0, 1, 0))) as fillet3_3_piece_7:
        with BuildLine():
            CenterArc((FILLET3_R, -FILLET3_R), FILLET3_R, 90, 90)
            Line((0, -FILLET3_R), (0, 0))
            Line((0, 0), (FILLET3_R, 0))
        make_face()
    extrude(amount=1, mode=Mode.SUBTRACT)
    with BuildSketch(Plane(origin=(21.5, 36, 84), x_dir=(0, 0, 1), z_dir=(0, 1, 0))) as fillet3_3_piece_8:
        with BuildLine():
            CenterArc((2 + FILLET3_R, -FILLET3_R), FILLET3_R, 90, 90)
            Line((2, -FILLET3_R), (2, 0))
            Line((2, 0), (2 + FILLET3_R, 0))
        make_face()
    revolve(axis=Axis((21.5, 36, 84), (1, 0, 0)), revolution_arc=90, mode=Mode.SUBTRACT)
    with BuildSketch(Plane(origin=(21.5, 36, 151.5), x_dir=(0, 0, -1), z_dir=(0, 1, 0))) as fillet3_3_piece_9:
        with BuildLine():
            CenterArc((2 + FILLET3_R, FILLET3_R), FILLET3_R, 180, 90)
            Line((2, FILLET3_R), (2, 0))
            Line((2, 0), (2 + FILLET3_R, 0))
        make_face()
    revolve(axis=Axis((21.5, 36, 151.5), (-1, 0, 0)), revolution_arc=90, mode=Mode.SUBTRACT)


solid = part.part
